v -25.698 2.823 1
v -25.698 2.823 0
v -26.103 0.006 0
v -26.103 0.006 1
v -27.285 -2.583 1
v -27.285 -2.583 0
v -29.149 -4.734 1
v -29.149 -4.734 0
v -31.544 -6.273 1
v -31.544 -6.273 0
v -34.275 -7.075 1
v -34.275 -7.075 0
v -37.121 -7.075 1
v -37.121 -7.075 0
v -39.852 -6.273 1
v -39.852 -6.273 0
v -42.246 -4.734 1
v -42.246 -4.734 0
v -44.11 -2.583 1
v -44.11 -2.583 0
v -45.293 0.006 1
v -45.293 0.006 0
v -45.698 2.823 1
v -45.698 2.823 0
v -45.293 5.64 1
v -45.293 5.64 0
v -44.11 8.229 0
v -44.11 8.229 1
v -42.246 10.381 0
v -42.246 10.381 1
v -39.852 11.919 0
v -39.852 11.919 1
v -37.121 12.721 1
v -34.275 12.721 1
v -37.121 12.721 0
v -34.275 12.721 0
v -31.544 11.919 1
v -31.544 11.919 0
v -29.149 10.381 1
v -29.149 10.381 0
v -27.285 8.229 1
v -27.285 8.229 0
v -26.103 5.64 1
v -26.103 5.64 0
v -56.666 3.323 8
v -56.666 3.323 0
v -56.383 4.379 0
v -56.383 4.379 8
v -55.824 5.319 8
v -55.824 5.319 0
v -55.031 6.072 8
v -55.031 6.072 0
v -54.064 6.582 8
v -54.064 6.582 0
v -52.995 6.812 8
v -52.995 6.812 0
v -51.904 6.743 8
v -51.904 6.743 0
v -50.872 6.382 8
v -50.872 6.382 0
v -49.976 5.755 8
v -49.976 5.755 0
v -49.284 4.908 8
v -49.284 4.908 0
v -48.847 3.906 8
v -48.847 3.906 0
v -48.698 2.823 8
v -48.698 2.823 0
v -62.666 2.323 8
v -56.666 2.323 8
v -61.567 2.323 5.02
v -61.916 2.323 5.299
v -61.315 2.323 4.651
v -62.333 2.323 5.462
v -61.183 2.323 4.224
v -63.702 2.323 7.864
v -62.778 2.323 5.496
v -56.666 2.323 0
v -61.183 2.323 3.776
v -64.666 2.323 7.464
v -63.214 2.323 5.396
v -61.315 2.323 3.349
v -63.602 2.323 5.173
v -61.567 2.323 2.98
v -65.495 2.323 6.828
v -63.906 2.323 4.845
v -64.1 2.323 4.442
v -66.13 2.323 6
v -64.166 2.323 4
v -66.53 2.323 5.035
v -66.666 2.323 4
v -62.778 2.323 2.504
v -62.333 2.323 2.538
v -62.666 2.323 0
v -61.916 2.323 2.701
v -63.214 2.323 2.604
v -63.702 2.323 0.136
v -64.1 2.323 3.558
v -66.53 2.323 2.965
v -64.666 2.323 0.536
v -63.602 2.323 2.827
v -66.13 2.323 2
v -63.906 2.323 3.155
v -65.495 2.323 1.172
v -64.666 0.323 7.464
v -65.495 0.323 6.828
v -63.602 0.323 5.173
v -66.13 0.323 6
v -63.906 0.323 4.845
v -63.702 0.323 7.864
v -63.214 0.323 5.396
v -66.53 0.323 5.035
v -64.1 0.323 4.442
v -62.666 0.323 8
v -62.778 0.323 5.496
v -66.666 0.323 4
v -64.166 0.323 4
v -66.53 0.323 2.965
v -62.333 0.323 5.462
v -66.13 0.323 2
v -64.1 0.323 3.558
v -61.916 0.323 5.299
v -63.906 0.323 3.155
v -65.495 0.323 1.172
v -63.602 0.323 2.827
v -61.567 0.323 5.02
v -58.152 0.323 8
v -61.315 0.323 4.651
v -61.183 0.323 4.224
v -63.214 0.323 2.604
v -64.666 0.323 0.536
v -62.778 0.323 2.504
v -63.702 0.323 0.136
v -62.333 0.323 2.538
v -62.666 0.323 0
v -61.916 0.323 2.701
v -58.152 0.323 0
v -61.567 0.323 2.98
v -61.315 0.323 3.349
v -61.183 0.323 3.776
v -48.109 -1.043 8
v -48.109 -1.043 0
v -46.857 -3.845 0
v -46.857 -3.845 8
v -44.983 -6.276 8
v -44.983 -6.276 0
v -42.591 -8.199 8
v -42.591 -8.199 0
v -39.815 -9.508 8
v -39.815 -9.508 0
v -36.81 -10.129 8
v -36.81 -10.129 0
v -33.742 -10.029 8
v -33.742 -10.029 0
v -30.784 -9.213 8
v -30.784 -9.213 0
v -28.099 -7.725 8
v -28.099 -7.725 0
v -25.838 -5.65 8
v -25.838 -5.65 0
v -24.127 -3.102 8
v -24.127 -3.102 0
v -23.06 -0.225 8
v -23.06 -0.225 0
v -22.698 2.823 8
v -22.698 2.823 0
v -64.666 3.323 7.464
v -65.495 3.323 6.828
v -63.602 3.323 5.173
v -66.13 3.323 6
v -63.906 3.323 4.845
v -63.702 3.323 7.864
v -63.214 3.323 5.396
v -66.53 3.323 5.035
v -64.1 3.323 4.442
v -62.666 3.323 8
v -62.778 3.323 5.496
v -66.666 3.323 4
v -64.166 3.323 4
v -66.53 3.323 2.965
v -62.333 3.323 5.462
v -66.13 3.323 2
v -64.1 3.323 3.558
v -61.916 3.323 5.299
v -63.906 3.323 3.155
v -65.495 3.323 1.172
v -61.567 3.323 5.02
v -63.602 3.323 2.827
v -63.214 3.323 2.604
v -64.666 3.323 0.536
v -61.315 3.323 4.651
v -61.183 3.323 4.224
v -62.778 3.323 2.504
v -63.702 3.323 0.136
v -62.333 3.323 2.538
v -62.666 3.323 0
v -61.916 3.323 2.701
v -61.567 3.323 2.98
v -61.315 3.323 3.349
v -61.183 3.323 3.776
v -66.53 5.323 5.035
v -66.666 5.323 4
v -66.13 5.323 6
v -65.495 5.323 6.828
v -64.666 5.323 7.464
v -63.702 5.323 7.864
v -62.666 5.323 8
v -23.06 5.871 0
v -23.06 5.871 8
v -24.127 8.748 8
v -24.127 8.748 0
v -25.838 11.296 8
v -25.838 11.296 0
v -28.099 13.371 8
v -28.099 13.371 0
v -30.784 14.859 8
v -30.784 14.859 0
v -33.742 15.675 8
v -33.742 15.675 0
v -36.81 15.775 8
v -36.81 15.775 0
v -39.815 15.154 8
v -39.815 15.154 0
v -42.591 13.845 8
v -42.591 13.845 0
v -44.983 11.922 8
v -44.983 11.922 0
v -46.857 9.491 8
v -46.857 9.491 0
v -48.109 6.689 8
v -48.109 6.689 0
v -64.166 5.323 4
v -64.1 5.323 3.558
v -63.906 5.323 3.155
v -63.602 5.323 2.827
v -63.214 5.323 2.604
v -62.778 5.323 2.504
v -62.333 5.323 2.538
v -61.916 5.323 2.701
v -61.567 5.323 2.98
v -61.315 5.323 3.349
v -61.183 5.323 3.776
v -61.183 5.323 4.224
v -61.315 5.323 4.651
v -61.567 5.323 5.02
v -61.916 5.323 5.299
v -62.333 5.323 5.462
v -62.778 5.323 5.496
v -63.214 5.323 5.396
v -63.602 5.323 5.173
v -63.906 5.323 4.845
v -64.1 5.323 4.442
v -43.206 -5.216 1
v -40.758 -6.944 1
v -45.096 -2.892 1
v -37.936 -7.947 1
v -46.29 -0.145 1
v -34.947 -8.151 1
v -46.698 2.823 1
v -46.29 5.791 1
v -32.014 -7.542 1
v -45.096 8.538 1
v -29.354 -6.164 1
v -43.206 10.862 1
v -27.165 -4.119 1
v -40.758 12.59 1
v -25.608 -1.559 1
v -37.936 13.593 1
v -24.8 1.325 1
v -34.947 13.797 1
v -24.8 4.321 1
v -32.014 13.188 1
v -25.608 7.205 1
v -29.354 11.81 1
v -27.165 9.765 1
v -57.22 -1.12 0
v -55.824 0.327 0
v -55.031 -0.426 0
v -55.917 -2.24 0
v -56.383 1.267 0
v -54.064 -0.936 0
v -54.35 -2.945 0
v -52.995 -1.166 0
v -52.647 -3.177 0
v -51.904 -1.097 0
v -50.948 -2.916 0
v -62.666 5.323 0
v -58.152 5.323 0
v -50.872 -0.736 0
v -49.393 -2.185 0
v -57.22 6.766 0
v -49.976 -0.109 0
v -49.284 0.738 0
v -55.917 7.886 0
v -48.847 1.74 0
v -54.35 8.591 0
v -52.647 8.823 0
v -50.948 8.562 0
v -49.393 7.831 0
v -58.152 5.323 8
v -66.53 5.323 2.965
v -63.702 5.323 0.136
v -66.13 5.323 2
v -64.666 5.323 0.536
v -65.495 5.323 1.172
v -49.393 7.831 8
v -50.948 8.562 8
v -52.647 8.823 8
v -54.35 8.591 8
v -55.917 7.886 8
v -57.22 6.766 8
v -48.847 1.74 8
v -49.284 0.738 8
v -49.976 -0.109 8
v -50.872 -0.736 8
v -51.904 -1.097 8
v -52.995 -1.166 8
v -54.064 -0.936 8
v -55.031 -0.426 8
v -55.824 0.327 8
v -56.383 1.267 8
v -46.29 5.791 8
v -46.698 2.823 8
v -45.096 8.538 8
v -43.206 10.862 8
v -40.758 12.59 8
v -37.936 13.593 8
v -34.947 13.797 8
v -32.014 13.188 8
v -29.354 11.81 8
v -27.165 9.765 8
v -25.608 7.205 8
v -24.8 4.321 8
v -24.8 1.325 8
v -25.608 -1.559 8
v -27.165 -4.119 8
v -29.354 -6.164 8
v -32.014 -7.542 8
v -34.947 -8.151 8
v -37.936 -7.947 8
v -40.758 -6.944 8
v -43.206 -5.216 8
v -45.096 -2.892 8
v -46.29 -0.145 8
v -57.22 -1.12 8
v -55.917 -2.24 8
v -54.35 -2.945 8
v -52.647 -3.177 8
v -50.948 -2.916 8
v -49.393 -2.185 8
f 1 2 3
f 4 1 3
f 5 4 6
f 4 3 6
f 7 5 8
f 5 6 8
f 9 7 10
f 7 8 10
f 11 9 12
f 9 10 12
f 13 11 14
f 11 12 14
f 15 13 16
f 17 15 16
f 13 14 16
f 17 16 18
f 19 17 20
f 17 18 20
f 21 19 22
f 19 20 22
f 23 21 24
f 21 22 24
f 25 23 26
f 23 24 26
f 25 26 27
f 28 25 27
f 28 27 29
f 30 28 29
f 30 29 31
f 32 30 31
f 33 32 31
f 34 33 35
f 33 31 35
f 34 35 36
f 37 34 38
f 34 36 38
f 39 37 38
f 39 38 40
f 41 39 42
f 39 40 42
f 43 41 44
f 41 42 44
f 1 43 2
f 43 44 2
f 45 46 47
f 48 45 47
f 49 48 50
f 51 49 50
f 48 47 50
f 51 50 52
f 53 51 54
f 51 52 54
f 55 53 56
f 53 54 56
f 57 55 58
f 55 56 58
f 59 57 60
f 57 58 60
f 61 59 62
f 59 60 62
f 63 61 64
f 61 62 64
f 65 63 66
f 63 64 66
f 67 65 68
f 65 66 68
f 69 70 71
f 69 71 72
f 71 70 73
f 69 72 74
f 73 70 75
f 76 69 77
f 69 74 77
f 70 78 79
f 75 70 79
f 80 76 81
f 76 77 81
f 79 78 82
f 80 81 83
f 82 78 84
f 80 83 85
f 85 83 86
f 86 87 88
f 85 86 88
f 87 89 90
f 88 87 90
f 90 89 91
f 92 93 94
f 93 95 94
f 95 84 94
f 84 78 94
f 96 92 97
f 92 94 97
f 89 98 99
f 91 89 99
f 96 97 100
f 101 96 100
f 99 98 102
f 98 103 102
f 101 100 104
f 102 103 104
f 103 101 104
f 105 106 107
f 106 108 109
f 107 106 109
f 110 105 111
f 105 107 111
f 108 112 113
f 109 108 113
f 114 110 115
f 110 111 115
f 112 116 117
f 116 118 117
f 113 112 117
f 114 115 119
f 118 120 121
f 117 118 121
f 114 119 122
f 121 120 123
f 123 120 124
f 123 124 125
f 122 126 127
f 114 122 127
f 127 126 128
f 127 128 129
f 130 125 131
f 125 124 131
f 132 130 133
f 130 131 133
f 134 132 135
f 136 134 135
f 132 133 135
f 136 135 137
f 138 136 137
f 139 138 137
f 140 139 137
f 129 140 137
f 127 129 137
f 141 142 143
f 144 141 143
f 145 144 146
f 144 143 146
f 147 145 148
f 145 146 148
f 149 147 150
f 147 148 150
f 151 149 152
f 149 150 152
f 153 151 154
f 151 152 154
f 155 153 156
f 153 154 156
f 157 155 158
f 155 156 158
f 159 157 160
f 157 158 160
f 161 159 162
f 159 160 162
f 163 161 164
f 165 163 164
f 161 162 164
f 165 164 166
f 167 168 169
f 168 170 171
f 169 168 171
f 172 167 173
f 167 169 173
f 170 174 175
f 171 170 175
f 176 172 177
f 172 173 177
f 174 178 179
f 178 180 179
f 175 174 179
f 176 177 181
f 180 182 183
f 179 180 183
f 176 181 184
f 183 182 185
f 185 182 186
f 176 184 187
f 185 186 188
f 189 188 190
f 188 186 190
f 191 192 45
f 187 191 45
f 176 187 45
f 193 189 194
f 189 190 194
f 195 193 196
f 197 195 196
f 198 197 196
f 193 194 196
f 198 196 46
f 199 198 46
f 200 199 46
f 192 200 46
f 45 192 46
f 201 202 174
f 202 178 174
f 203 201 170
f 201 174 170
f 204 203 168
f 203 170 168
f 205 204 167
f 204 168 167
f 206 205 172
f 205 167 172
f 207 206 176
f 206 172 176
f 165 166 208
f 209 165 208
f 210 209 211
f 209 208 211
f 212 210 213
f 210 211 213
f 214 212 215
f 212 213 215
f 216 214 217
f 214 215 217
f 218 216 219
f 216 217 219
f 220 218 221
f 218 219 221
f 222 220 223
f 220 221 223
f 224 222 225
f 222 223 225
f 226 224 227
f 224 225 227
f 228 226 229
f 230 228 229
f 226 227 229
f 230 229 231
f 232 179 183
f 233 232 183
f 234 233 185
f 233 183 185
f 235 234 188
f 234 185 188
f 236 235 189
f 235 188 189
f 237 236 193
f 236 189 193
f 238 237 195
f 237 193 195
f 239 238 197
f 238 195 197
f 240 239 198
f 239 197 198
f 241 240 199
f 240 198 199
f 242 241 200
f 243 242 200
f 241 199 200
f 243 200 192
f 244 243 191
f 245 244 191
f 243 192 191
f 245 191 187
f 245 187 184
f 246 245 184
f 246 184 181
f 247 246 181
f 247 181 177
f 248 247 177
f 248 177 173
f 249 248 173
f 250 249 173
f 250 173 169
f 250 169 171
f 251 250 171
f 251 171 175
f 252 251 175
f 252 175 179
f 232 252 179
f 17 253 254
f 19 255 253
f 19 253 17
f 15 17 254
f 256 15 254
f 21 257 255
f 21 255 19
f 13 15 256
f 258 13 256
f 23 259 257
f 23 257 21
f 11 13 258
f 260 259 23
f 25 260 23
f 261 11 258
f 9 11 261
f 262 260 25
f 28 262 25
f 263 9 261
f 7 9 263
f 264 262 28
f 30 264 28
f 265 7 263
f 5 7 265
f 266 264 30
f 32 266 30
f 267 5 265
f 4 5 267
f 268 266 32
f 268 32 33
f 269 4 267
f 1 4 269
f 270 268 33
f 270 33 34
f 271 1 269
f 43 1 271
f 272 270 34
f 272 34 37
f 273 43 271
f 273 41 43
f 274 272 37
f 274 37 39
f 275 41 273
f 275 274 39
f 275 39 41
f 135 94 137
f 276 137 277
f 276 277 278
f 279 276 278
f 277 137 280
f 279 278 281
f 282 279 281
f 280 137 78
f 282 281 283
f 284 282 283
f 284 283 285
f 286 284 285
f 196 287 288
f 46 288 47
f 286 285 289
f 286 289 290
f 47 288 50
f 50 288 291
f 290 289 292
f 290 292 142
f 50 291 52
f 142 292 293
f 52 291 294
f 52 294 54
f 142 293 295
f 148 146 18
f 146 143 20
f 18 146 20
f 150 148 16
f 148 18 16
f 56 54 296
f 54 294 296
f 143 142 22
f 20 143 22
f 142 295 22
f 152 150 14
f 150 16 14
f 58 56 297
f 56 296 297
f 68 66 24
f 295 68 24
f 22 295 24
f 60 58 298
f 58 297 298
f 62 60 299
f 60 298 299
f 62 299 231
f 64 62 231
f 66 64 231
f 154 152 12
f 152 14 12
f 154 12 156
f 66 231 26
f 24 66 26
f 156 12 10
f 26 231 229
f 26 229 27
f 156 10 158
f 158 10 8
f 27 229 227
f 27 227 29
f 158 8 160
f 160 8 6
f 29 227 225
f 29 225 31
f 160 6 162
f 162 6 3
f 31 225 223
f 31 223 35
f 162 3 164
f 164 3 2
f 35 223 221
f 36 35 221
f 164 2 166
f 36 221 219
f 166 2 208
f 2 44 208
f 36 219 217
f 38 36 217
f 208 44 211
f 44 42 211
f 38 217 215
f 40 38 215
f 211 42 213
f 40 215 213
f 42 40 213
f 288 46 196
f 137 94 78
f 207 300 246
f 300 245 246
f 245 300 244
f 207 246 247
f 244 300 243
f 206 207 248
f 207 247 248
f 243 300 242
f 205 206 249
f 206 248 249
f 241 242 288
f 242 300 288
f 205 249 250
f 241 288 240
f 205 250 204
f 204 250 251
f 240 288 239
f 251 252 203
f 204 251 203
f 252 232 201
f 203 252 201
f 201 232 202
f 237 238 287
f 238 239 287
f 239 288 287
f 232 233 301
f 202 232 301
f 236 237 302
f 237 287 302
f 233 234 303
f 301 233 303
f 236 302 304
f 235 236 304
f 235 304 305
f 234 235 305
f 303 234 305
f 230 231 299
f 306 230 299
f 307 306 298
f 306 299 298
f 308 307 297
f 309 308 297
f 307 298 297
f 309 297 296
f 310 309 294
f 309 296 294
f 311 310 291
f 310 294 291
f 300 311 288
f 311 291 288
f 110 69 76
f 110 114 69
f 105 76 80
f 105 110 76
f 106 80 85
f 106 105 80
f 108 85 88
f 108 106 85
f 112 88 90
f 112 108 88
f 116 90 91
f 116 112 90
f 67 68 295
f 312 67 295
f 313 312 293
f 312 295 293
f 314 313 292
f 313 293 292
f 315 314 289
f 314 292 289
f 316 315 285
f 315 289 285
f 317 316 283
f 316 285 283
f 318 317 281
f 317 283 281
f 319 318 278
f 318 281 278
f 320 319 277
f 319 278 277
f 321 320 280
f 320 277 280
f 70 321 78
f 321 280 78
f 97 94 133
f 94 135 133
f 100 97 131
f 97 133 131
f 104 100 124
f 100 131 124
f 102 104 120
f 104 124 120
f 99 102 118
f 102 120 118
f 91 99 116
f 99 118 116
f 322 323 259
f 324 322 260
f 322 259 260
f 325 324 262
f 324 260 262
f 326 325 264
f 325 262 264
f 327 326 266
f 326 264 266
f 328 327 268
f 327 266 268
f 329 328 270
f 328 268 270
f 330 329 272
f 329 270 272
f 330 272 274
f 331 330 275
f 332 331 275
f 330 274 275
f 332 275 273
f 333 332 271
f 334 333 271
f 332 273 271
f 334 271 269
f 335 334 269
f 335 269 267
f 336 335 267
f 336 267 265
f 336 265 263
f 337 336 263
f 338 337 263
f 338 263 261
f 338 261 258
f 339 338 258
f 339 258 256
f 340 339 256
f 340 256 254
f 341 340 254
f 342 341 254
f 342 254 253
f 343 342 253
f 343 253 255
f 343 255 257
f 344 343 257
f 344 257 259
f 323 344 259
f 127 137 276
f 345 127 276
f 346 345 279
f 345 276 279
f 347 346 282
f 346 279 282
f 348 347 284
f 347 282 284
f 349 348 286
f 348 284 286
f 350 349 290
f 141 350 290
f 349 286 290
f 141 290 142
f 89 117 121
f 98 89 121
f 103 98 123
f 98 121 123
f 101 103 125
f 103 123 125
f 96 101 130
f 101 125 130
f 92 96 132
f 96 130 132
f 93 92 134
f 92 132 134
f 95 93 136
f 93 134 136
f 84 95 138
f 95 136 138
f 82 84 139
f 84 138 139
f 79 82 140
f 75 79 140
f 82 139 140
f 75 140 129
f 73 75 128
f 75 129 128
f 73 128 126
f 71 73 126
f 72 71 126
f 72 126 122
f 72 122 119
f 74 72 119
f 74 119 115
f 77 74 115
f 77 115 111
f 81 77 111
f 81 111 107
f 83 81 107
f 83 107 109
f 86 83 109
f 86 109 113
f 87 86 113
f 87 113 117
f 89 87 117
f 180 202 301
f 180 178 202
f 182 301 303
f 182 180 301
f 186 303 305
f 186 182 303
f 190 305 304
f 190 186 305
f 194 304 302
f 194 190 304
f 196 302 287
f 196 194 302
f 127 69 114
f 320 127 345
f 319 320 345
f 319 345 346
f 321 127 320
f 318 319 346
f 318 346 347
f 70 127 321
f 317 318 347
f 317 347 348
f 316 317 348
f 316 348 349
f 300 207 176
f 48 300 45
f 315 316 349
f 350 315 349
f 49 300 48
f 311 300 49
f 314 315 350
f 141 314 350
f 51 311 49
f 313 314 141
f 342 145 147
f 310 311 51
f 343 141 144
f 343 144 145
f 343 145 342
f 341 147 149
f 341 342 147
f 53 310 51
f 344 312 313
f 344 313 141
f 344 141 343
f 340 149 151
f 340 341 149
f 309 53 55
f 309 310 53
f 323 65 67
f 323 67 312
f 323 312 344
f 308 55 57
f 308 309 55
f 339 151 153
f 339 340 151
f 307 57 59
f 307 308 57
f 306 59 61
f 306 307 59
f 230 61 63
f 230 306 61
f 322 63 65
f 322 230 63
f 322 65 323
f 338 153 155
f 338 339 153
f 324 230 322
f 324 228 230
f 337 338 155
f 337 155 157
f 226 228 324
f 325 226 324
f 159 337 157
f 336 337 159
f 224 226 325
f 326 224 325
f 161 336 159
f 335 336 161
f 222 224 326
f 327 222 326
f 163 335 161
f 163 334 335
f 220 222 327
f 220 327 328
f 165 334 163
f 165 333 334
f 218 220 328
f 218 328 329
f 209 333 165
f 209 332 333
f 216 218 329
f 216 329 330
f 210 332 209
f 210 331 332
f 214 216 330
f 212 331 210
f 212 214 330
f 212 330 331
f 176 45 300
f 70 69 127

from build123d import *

# Parameters (mm, degrees)
F1_DEPTH = 1
F2_DEPTH = 8
F4_R     = 3.99999
F5_DEPTH = 5


# Not quite as in the source:
# - a fillet or chamfer is up to 0.001 mm smaller than in the source, because OpenCascade refuses the exact size


with BuildPart() as f1:
    # F0 (on Top) → F1 (new body)
    with BuildSketch(Plane.XY):
        with BuildLine():
            ThreePointArc((-24.6977130771, 2.8230095394), (-35.6977130771, 13.8230095394), (-46.6977130771, 2.8230095394))
            ThreePointArc((-46.6977130771, 2.8230095394), (-35.6977130771, -8.1769904606), (-24.6977130771, 2.8230095394))
        make_face()
        with BuildLine():
            ThreePointArc((-45.6977130771, 2.8230095394), (-35.6977130771, 12.8230095394), (-25.6977130771, 2.8230095394))
            ThreePointArc((-25.6977130771, 2.8230095394), (-35.6977130771, -7.1769904606), (-45.6977130771, 2.8230095394))
        make_face(mode=Mode.SUBTRACT)
    extrude(amount=F1_DEPTH)

    # F0 (on Top) → F2 (join)
    with BuildSketch(Plane.XY):
        with BuildLine():
            ThreePointArc((-58.6768434486, 3.3230095394), (-58.5012596634, 4.3457856294), (-58.1520691344, 5.3230095394))
            Line((-58.1520691344, 5.3230095394), (-66.6663400437, 5.3230095394))
            Line((-66.6663400437, 5.3230095394), (-66.6663400437, 3.3230095394))
            Line((-66.6663400437, 3.3230095394), (-61.1977130771, 3.3230095394))
            Line((-61.1977130771, 3.3230095394), (-58.6768434486, 3.3230095394))
        make_face()
        with BuildLine():
            Line((-66.6663400437, 0.3230095394), (-58.1520691344, 0.3230095394))
            ThreePointArc((-58.1520691344, 0.3230095394), (-58.5012596634, 1.3002334494), (-58.6768434486, 2.3230095394))
            Line((-58.6768434486, 2.3230095394), (-61.1977130771, 2.3230095394))
            Line((-61.1977130771, 2.3230095394), (-66.6663400437, 2.3230095394))
            Line((-66.6663400437, 2.3230095394), (-66.6663400437, 0.3230095394))
        make_face()
        with BuildLine():
            Line((-58.6768434486, 3.3230095394), (-56.6663400437, 3.3230095394))
            Line((-56.6663400437, 3.3230095394), (-56.6663400437, 5.3230095394))
            Line((-56.6663400437, 5.3230095394), (-58.1520691344, 5.3230095394))
            ThreePointArc((-58.1520691344, 5.3230095394), (-58.5012596634, 4.3457856294), (-58.6768434486, 3.3230095394))
        make_face()
        with BuildLine():
            Line((-56.6663400437, 0.3230095394), (-56.6663400437, 2.3230095394))
            Line((-56.6663400437, 2.3230095394), (-58.6768434486, 2.3230095394))
            ThreePointArc((-58.6768434486, 2.3230095394), (-58.5012596634, 1.3002334494), (-58.1520691344, 0.3230095394))
            Line((-58.1520691344, 0.3230095394), (-56.6663400437, 0.3230095394))
        make_face()
        with BuildLine():
            ThreePointArc((-56.6663400437, 3.3230095394), (-52.4472214269, 6.8151585763), (-48.6977130771, 2.8230095394))
            ThreePointArc((-48.6977130771, 2.8230095394), (-48.5498129284, 4.7783942616), (-48.109477783, 6.6892864159))
            ThreePointArc((-48.109477783, 6.6892864159), (-53.5065513921, 8.768241291), (-58.1520691344, 5.3230095394))
            Line((-58.1520691344, 5.3230095394), (-56.6663400437, 5.3230095394))
            Line((-56.6663400437, 5.3230095394), (-56.6663400437, 3.3230095394))
        make_face()
        with BuildLine():
            ThreePointArc((-48.109477783, -1.0432673371), (-48.5498129284, 0.8676248172), (-48.6977130771, 2.8230095394))
            ThreePointArc((-48.6977130771, 2.8230095394), (-52.4472214269, -1.1691394976), (-56.6663400437, 2.3230095394))
            Line((-56.6663400437, 2.3230095394), (-56.6663400437, 0.3230095394))
            Line((-56.6663400437, 0.3230095394), (-58.1520691344, 0.3230095394))
            ThreePointArc((-58.1520691344, 0.3230095394), (-53.5065513921, -3.1222222122), (-48.109477783, -1.0432673371))
        make_face()
        with BuildLine():
            ThreePointArc((-48.109477783, 6.6892864159), (-47.0616944573, 4.8809925611), (-46.6977130771, 2.8230095394))
            ThreePointArc((-46.6977130771, 2.8230095394), (-47.0616944573, 0.7650265177), (-48.109477783, -1.0432673371))
            ThreePointArc((-48.109477783, -1.0432673371), (-33.7423283549, -10.0290903119), (-22.6977130771, 2.8230095394))
            ThreePointArc((-22.6977130771, 2.8230095394), (-33.7423283549, 15.6751093907), (-48.109477783, 6.6892864159))
        make_face()
        with BuildLine():
            ThreePointArc((-24.6977130771, 2.8230095394), (-35.6977130771, -8.1769904606), (-46.6977130771, 2.8230095394))
            ThreePointArc((-46.6977130771, 2.8230095394), (-35.6977130771, 13.8230095394), (-24.6977130771, 2.8230095394))
        make_face(mode=Mode.SUBTRACT)
        with BuildLine():
            ThreePointArc((-48.109477783, -1.0432673371), (-47.0616944573, 0.7650265177), (-46.6977130771, 2.8230095394))
            Line((-46.6977130771, 2.8230095394), (-48.6977130771, 2.8230095394))
            ThreePointArc((-48.6977130771, 2.8230095394), (-48.5498129284, 0.8676248172), (-48.109477783, -1.0432673371))
        make_face()
        with BuildLine():
            Line((-48.6977130771, 2.8230095394), (-46.6977130771, 2.8230095394))
            ThreePointArc((-46.6977130771, 2.8230095394), (-47.0616944573, 4.8809925611), (-48.109477783, 6.6892864159))
            ThreePointArc((-48.109477783, 6.6892864159), (-48.5498129284, 4.7783942616), (-48.6977130771, 2.8230095394))
        make_face()
    extrude(amount=F2_DEPTH)

    # F4 (radius 4 in the source; OpenCascade refuses exactly that, so slightly less here)
    f4_edges = [f1.edges().sort_by_distance(p)[0] for p in [
        (-66.66634, 4.32301, 8),
        (-66.66634, 1.32301, 8),
        (-66.66634, 4.32301, 0),
        (-66.66634, 1.32301, 0),
    ]]
    fillet(f4_edges, radius=F4_R)

    # F3 (on face) → F5 (cut)
    with BuildSketch(Plane.XZ.offset(-0.3230095394)):
        with BuildLine():
            Line((-64.1663400437, 4), (-61.1663400437, 4))
            ThreePointArc((-61.1663400437, 4), (-62.6663400437, 5.5), (-64.1663400437, 4))
        make_face()
        with BuildLine():
            ThreePointArc((-64.1663400437, 4), (-62.6663400437, 2.5), (-61.1663400437, 4))
            Line((-61.1663400437, 4), (-64.1663400437, 4))
        make_face()
    extrude(amount=-F5_DEPTH, mode=Mode.SUBTRACT)


solid = f1.part
